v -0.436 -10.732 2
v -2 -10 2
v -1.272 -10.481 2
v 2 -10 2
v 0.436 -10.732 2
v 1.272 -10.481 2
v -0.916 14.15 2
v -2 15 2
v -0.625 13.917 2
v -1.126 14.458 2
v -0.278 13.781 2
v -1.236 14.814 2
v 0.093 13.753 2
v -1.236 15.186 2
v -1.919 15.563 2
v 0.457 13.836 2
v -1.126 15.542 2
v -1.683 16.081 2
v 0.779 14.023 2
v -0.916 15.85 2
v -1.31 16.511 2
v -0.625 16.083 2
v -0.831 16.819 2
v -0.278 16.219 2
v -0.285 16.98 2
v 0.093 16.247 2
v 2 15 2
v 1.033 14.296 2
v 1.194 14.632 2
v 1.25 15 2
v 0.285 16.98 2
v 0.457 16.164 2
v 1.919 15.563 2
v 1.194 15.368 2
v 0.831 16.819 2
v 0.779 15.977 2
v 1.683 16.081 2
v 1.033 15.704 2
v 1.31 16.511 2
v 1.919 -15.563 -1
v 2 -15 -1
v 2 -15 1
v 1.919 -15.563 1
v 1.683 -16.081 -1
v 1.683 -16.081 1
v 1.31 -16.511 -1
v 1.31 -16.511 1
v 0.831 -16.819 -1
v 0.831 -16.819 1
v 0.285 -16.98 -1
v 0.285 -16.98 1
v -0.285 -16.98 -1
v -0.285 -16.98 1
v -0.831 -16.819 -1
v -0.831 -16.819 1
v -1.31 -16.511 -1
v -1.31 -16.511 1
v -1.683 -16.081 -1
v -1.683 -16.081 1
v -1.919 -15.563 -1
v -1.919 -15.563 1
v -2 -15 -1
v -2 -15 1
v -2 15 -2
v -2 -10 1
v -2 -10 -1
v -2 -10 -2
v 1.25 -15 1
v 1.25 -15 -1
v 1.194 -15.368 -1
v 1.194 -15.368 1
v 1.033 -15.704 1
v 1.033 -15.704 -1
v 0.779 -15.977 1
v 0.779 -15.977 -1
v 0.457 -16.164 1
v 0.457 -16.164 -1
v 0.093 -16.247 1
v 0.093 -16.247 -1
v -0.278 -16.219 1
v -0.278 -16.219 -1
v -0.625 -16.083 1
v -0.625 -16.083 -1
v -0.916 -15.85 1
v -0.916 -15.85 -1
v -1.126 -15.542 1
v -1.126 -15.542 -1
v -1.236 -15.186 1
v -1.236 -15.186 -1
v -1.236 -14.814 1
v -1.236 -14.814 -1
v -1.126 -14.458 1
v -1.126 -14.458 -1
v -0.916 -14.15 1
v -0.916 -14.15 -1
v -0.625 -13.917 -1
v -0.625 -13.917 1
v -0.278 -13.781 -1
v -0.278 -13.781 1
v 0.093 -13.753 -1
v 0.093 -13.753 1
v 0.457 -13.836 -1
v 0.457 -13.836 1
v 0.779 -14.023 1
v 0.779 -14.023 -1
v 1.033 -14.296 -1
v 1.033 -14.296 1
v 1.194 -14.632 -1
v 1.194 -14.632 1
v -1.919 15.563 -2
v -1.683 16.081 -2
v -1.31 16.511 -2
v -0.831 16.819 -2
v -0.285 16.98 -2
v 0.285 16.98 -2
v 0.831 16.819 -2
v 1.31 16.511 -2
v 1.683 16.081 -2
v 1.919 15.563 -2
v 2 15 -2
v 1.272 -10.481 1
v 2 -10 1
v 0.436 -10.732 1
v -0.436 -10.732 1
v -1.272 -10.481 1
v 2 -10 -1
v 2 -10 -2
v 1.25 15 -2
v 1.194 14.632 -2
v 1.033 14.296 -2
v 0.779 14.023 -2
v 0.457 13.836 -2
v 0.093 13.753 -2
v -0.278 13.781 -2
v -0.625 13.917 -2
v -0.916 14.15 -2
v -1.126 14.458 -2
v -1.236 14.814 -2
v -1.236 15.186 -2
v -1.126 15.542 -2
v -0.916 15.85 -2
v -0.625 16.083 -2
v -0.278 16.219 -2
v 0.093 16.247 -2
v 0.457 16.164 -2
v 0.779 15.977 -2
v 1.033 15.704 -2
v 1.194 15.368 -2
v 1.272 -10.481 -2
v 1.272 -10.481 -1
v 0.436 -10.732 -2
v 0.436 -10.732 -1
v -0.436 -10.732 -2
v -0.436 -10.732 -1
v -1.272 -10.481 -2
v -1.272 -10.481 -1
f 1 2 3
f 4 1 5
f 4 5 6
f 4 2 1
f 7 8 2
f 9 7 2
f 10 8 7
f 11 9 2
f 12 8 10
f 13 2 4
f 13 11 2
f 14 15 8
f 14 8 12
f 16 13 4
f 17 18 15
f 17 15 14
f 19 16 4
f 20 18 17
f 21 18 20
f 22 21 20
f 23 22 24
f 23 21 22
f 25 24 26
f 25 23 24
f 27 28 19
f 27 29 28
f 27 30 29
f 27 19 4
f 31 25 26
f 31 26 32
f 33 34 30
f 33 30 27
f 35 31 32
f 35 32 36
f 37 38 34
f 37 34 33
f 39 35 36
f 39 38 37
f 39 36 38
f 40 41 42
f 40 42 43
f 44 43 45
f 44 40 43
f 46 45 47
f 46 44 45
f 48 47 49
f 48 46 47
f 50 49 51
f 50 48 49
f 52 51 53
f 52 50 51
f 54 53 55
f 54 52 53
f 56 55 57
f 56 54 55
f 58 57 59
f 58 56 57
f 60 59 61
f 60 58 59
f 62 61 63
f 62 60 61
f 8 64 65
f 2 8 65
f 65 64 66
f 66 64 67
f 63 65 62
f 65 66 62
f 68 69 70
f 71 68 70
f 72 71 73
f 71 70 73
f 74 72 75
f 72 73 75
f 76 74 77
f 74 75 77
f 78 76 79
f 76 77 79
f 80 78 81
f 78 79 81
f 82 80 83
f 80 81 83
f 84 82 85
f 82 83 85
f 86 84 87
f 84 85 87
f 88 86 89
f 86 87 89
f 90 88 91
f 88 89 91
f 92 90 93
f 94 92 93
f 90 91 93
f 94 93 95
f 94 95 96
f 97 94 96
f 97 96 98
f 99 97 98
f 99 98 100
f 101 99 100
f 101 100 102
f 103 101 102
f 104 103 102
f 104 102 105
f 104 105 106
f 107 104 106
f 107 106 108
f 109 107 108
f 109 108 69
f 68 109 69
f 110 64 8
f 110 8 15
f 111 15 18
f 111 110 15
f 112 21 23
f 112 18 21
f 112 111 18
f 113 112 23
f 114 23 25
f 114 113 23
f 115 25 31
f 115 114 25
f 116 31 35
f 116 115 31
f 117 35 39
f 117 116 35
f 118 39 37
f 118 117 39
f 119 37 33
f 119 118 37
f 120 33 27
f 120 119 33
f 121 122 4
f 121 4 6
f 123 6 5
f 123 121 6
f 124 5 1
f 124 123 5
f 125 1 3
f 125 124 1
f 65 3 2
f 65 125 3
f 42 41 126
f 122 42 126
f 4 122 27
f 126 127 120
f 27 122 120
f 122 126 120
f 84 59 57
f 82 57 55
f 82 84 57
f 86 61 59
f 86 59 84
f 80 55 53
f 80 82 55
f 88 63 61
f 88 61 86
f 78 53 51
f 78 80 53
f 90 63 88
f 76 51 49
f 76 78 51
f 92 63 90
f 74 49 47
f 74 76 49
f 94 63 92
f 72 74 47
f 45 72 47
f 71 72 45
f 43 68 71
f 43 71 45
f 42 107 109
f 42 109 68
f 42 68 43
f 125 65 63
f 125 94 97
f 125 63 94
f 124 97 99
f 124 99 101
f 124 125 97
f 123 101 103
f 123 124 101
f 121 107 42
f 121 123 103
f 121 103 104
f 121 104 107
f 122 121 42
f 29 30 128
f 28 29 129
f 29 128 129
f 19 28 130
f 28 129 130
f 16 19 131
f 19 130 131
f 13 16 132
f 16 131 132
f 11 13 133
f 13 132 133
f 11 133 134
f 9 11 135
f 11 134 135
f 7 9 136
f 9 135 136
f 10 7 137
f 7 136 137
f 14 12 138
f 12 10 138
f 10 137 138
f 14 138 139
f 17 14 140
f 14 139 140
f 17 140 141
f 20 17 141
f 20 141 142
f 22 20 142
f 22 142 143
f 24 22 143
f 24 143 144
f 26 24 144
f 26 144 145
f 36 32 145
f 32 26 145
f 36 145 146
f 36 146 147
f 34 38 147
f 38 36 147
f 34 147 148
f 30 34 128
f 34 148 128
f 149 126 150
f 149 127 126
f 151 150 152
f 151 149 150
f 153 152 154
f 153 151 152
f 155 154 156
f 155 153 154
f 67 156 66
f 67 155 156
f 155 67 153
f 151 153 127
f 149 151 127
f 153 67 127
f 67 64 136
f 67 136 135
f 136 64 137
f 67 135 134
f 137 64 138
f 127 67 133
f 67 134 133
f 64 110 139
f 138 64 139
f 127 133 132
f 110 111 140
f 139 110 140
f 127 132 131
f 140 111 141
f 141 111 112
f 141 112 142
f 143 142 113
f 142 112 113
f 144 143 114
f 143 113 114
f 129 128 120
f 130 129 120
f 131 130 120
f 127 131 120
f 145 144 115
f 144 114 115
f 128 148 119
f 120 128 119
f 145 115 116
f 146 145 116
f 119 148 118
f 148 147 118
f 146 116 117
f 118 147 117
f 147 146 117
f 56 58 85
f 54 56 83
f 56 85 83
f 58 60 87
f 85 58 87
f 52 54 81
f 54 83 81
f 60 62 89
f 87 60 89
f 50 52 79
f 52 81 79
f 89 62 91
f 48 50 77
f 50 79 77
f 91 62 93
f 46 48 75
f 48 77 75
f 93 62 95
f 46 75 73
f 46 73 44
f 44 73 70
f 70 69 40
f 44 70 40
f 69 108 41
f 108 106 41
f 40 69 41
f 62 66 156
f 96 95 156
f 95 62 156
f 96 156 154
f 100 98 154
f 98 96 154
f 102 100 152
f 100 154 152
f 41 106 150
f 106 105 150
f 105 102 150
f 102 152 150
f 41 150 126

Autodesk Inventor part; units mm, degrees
ref_plane "YZ Plane" through (0, 0, 0) normal (1, 0, 0) x (0, 1, 0)
ref_plane "XZ Plane" through (0, 0, 0) normal (0, 1, 0) x (-1, 0, 0)
ref_plane "XY Plane" through (0, 0, 0) normal (0, 0, 1) x (1, 0, 0)
sketch "Sketch6" plane through (0, 0, 0) normal (0, 0, 1) x (1, 0, 0)
  line L0 (0, 0) -> (0, 15)
  line L1 (0, 15) -> (2, 15)
  line L2 (2, 15) -> (-2, 15)
  line L3 (-2, 15) -> (-2, -15)
  line L4 (-2, -15) -> (2, -15)
  line L5 (2, -15) -> (2, 15)
  circle A0 centre (0, 15) radius 1.25
  circle A1 centre (0, 15) radius 2
  circle A2 centre (0, -15) radius 1.25
  circle A3 centre (0, -15) radius 2
  line L6 (-2, -15) -> (-2, -10)
  line L7 (2, -15) -> (2, -10)
  line L8 (-2, 15) -> (2, 15)
  line L9 (2, 15) -> (2, 14)
  line L10 (2, 14) -> (-2, 14)
  line L11 (-2, 14) -> (-2, 15)
  arc A4 (-2, 14) -> (2, 14) centre (0, 14) ccw
  arc A5 (-2, -10) -> (2, -10) centre (0, -7.7639) ccw
  point P0 (-2, 14)
  point P1 (0, 12)
  point P2 (0, 13.75)
  point P3 (1.25, 15)
  dimension "d115" = 15
  dimension "d116" = 2
  dimension "d117" = 4
  dimension "d118" = 30
  dimension "d119" = 2.5
  dimension "d120" = 2.5
  dimension "d122" = 5
  dimension "d124" = 1
  dimension "d125" = 2
  dimension "d132" = 3
  dimension "d133" = 5
extrude "Extrusion8" add sketch "Sketch6" along normal mid plane 4 contours A4 L10 A1 L0 | A4 L5 A5 L3 | L0 A1 L10 A4 | A1 L10 A0 L0 | L0 A0 L10 A1 | L3 A1 L10 | L10 A1 L5 | A1 L2 A0 L10 | L10 A0 L1 A1 | A1 L1 A0 L2
extrude "Extrusion9" cut sketch "Sketch6" along normal mid plane 2 contours A3 L4 A2 | L4 A2 A3
extrude "Extrusion10" add sketch "Sketch6" along normal mid plane 2 contours A5 L5 A3 L3 | A3 L4 A2 | L4 A2 A3
properties part number "link7" material "Aluminum 6061"
